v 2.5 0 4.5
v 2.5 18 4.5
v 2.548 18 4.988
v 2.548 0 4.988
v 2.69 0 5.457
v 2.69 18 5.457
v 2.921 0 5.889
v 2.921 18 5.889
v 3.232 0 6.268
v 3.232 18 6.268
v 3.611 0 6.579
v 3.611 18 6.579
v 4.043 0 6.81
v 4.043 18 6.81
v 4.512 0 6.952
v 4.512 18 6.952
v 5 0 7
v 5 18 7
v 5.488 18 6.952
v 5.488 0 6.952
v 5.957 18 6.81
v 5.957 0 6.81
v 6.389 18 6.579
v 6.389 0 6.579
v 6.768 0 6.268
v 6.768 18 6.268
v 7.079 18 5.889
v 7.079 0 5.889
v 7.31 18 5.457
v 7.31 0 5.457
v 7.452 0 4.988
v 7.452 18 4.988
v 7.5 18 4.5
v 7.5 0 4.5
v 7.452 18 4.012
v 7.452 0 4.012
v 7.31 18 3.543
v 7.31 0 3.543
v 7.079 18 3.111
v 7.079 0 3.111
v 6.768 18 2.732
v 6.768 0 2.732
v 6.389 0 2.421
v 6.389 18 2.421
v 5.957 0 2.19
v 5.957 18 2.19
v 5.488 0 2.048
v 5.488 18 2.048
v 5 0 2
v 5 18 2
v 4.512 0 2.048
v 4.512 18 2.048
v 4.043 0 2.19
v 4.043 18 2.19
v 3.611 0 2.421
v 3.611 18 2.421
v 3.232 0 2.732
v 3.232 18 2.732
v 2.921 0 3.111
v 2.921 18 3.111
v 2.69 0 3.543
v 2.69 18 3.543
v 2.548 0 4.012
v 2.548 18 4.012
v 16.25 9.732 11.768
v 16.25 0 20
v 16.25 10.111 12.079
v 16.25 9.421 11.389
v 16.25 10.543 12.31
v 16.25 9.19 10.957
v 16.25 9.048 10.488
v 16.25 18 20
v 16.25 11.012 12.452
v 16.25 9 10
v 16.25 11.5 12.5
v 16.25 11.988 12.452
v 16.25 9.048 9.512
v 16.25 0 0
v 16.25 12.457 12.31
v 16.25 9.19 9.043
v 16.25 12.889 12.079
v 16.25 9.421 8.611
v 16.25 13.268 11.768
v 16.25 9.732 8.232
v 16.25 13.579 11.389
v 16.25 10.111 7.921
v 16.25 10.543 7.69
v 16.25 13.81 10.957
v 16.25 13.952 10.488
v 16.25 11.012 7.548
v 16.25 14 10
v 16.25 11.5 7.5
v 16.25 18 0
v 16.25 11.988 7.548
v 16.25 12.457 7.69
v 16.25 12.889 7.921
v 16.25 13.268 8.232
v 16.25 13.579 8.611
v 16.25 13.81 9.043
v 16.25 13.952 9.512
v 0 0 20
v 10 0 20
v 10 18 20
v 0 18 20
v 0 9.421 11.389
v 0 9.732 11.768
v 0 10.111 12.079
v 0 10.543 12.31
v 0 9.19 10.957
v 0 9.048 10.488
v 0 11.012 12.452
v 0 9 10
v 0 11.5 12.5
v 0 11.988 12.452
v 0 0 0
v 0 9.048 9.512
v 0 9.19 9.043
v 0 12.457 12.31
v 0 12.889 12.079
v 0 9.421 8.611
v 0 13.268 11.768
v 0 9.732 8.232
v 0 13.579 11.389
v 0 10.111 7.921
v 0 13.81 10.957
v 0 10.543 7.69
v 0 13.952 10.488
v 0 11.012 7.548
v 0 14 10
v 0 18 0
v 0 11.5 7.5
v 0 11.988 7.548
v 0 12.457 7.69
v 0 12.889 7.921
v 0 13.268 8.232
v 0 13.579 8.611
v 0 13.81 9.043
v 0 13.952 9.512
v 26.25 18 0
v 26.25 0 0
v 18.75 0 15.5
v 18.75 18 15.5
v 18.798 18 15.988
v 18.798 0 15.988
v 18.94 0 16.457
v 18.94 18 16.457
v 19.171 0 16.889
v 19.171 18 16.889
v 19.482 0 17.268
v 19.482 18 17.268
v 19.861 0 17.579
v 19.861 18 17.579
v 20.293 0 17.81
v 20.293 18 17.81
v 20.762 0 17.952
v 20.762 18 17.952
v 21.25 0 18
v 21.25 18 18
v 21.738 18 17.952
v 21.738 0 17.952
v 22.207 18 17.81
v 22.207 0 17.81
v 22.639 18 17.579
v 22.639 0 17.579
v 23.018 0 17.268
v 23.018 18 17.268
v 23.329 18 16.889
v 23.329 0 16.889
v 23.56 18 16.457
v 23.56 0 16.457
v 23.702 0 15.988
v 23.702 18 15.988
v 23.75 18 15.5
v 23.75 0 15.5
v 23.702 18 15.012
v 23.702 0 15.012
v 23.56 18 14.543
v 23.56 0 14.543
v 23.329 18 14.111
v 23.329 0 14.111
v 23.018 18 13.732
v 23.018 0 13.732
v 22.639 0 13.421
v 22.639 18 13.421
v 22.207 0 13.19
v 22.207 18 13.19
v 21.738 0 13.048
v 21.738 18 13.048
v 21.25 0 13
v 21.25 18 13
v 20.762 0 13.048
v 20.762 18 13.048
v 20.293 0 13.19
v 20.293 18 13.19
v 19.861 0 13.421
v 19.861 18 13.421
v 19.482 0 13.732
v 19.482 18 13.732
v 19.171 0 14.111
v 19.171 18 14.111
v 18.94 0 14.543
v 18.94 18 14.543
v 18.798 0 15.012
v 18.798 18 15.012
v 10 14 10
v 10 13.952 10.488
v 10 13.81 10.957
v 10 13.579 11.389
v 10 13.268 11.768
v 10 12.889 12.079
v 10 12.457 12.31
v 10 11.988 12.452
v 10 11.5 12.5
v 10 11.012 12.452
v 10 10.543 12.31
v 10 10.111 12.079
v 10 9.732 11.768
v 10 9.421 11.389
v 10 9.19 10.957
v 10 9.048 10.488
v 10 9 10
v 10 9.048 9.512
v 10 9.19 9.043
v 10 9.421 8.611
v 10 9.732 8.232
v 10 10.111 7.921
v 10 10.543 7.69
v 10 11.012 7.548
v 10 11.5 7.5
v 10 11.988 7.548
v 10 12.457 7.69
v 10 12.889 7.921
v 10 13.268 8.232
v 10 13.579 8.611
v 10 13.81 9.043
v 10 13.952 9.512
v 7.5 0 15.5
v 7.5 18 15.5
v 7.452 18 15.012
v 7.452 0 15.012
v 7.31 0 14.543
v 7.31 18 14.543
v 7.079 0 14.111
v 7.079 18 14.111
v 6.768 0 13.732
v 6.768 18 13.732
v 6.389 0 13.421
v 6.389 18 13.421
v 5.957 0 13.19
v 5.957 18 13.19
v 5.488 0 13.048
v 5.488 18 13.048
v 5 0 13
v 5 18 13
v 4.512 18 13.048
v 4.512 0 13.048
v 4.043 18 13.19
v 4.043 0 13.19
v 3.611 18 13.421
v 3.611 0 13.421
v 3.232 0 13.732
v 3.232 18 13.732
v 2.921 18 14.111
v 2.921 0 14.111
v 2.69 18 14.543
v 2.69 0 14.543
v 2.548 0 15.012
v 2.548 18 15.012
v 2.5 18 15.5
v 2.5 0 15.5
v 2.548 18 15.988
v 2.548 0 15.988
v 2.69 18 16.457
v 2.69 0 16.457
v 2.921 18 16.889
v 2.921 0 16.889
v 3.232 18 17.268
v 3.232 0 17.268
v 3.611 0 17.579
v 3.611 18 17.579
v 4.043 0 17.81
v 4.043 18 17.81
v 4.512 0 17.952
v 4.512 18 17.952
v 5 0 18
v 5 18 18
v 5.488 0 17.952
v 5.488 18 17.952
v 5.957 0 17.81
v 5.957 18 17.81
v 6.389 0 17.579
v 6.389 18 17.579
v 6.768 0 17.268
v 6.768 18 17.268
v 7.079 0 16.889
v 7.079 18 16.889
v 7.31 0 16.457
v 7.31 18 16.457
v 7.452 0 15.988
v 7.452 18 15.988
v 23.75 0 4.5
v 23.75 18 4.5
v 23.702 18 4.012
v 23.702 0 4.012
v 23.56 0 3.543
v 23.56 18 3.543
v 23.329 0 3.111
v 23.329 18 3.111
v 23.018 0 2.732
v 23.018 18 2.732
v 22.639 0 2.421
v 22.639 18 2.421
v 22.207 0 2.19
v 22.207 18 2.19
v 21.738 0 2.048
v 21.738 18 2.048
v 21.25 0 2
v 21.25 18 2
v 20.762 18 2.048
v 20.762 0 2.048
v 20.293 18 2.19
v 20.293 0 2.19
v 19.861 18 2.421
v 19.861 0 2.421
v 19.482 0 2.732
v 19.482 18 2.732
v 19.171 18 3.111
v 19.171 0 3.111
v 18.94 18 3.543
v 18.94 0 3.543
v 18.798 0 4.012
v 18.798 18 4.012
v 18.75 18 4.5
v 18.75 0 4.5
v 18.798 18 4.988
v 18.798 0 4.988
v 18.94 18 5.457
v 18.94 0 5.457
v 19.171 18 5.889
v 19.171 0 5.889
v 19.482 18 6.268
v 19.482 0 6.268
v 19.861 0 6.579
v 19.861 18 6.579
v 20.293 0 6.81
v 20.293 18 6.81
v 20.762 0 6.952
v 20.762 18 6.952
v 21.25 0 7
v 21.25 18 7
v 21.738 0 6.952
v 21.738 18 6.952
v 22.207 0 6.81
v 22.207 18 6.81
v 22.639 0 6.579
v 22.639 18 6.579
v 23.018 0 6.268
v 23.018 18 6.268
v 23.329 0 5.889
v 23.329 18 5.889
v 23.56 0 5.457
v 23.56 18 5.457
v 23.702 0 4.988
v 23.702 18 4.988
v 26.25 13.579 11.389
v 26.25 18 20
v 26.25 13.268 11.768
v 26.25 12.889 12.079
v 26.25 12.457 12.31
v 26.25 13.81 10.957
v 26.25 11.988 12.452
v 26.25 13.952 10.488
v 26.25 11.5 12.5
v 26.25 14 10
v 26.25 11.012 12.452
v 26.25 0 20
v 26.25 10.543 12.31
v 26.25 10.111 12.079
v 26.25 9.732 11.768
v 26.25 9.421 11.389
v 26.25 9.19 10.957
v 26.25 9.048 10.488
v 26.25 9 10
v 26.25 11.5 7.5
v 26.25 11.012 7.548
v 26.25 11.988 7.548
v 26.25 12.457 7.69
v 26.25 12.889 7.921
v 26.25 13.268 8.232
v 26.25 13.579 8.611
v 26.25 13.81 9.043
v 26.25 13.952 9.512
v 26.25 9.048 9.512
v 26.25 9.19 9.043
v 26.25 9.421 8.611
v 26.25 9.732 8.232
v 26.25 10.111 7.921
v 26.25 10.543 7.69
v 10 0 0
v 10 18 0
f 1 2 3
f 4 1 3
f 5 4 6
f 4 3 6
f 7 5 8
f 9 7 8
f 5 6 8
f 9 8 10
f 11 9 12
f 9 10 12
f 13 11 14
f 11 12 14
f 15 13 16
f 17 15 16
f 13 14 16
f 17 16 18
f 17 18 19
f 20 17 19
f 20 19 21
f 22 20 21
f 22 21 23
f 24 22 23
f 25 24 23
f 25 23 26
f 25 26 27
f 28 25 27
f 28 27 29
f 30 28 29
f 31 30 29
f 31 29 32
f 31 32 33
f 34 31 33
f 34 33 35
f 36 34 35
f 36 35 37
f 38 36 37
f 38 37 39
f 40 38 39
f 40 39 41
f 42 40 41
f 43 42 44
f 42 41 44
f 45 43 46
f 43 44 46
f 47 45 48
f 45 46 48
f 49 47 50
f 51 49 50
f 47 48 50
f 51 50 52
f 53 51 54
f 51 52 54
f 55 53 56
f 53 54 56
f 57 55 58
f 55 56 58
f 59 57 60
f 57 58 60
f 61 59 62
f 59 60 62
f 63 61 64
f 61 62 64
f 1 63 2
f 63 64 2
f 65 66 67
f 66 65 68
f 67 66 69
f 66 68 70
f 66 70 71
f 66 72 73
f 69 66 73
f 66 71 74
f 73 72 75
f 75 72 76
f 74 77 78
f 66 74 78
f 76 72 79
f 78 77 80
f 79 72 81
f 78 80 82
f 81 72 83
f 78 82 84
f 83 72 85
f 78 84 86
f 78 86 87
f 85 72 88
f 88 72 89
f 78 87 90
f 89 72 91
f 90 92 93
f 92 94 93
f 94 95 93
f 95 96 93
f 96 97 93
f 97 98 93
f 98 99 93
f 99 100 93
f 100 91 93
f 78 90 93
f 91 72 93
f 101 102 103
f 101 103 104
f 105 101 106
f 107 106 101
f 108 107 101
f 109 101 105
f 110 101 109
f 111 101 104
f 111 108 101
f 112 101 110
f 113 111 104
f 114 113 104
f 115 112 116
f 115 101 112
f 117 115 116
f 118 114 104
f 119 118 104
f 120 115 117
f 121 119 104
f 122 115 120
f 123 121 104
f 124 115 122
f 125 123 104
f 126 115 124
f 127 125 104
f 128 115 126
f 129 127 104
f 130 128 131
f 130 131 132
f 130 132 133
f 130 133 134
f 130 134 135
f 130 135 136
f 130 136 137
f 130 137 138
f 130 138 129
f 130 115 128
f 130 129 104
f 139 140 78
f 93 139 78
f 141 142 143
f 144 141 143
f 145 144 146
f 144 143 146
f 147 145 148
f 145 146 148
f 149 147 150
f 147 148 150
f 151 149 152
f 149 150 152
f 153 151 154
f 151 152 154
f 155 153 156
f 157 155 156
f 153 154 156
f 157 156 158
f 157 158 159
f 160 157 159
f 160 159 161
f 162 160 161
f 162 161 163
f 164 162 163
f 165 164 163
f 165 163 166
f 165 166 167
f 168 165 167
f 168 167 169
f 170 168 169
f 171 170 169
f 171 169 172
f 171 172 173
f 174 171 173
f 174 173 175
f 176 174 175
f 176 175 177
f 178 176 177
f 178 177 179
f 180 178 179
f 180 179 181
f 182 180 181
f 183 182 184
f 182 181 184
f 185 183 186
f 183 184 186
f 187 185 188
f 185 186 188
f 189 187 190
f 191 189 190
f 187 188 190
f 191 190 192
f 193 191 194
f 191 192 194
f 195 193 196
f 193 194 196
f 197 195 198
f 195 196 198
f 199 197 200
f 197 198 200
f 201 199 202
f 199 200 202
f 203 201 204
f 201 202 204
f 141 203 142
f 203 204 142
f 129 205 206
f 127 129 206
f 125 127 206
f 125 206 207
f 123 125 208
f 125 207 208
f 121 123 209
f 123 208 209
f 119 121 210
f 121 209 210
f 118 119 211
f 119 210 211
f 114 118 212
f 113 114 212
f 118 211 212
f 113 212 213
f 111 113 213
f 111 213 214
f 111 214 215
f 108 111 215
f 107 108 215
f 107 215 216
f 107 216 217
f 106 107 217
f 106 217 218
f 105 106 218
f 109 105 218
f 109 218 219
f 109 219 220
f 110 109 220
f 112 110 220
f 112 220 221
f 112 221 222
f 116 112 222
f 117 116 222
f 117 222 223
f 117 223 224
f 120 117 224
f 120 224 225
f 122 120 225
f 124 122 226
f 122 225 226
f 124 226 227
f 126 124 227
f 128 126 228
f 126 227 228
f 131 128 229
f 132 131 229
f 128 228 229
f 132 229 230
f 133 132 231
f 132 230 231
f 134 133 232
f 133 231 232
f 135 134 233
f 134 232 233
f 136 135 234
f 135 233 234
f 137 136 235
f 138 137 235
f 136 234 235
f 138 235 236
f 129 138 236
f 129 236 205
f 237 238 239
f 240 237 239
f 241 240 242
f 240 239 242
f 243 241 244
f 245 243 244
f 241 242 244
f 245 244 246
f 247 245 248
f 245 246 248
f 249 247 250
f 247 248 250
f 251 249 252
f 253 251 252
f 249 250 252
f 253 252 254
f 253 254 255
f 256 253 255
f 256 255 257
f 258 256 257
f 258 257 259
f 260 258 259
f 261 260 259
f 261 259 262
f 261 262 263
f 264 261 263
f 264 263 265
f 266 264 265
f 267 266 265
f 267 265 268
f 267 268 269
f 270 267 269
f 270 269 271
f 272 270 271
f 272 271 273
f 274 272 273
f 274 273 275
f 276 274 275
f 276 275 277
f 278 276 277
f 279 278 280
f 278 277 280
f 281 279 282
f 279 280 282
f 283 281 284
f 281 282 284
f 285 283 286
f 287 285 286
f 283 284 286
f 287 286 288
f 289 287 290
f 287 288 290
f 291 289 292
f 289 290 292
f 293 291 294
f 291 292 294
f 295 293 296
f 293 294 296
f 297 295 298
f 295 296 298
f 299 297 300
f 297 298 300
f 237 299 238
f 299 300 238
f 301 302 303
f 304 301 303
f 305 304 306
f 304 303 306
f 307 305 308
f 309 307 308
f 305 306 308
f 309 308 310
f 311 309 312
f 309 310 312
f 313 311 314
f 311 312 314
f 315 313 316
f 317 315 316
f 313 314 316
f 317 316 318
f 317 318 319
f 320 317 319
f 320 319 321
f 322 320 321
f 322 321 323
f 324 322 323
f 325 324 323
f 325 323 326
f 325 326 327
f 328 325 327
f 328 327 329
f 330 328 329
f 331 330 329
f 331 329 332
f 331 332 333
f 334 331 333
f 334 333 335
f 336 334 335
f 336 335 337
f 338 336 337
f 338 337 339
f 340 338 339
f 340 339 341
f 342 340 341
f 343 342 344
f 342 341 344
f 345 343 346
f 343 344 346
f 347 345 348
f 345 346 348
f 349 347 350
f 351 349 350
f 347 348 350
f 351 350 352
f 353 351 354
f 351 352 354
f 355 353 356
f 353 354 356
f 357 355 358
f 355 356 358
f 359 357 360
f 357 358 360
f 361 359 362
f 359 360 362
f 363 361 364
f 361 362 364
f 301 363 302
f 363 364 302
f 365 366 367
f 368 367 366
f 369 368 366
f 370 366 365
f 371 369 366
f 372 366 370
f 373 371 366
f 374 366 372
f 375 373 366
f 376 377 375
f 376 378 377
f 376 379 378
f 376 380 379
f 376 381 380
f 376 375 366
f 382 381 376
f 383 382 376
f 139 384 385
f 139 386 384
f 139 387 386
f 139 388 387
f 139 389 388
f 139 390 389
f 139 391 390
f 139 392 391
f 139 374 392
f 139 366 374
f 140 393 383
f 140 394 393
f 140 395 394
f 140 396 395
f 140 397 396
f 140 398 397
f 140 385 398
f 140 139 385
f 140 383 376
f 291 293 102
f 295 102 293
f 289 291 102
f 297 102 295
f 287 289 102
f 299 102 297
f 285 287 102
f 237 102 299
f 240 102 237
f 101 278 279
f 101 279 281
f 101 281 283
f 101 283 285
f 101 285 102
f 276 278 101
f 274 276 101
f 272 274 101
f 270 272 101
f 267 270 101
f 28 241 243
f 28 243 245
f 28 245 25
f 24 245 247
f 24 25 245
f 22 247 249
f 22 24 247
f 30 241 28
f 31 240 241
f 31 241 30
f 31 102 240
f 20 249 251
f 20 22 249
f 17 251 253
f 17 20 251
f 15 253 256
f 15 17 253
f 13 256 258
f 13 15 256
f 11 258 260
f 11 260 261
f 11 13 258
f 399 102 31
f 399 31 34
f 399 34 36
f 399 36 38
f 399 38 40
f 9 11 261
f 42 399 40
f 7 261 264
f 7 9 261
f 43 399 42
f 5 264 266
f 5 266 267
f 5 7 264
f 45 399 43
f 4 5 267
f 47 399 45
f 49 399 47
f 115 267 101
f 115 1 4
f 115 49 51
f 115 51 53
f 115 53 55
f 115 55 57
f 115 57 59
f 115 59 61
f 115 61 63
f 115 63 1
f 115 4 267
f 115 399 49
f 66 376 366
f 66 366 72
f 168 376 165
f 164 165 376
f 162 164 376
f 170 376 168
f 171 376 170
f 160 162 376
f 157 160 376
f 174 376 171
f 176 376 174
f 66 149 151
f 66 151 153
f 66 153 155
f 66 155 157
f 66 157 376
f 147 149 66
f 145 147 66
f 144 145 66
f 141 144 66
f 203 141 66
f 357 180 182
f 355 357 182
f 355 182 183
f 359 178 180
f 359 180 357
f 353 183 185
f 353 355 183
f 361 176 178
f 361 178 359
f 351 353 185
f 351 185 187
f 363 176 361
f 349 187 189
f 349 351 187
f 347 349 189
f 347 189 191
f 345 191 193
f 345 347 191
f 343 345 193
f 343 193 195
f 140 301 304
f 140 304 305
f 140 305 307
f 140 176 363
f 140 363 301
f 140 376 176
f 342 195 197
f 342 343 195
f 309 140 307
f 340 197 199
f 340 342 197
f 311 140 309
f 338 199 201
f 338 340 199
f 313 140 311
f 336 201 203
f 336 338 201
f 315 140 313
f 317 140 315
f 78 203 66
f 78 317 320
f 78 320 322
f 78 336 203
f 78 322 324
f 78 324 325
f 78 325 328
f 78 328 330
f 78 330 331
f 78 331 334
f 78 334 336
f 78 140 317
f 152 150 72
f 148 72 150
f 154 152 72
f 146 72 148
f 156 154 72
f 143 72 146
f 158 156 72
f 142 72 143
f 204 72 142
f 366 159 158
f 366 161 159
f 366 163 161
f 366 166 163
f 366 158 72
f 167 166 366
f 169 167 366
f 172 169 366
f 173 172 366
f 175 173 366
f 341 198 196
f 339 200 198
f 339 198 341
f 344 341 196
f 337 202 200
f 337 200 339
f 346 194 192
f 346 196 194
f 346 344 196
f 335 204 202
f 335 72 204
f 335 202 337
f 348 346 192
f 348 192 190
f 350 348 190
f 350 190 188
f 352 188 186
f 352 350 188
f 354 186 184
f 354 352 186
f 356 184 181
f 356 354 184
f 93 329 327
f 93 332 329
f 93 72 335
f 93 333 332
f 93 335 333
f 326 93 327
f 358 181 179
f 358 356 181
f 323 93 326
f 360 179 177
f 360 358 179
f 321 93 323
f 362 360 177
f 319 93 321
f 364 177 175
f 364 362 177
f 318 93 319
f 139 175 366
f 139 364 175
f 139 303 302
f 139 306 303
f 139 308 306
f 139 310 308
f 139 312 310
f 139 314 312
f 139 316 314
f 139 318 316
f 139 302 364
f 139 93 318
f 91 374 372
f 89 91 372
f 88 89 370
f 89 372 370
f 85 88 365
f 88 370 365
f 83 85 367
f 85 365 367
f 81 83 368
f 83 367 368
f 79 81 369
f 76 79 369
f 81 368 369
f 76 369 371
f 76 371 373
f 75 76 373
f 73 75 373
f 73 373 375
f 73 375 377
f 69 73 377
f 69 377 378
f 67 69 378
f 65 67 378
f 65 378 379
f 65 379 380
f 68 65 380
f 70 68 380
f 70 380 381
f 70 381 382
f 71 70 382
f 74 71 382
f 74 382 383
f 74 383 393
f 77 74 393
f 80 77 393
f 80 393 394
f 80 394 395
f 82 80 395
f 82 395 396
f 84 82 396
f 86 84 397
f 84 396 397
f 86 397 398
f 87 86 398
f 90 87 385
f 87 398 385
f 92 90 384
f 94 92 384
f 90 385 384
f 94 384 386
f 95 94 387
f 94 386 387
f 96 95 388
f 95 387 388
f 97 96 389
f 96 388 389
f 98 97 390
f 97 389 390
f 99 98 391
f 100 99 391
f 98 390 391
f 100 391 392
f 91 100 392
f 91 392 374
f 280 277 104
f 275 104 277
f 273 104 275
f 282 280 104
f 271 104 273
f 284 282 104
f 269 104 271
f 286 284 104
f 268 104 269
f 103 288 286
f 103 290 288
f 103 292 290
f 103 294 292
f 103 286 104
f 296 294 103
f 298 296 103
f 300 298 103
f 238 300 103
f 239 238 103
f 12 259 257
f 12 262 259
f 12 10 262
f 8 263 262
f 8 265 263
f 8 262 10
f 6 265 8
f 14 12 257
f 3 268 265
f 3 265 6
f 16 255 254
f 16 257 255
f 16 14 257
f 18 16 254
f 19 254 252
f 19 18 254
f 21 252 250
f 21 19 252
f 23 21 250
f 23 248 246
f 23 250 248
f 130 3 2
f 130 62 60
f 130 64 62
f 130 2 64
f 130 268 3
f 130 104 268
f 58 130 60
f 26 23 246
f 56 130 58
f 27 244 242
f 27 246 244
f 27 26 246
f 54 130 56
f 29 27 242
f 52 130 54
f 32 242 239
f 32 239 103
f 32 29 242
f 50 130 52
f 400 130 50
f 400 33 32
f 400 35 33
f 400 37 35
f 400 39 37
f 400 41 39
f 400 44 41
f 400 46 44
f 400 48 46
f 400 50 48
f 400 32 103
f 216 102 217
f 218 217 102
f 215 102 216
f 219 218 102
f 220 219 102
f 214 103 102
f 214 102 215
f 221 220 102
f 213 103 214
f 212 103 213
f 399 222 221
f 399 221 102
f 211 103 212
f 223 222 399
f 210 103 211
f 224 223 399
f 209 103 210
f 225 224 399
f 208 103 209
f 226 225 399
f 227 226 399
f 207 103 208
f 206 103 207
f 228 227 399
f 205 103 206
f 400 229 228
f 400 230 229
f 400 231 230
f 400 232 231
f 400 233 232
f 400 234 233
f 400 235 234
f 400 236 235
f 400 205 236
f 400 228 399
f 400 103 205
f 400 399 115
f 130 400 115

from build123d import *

# Parameters (mm, degrees)
BOSS_EXTRUDE1_DEPTH = 20
SKETCH3_R           = 2.5
CUT_EXTRUDE1_DEPTH  = 38.59072359
SKETCH4_R           = 2.5
CUT_EXTRUDE4_DEPTH  = 38.59072359
SKETCH5_W           = 6.25
SKETCH5_H           = 20
CUT_EXTRUDE5_DEPTH  = 37.25


with BuildPart() as part:
    # Sketch2 → Boss-Extrude1 (new body)
    with BuildSketch(Plane.XY):
        Polygon((0, 0), (0, 18), (10, 18), (10, 3), (16.25, 3), (16.25, 18), (26.25, 18), (26.25, 0), align=None)
    extrude(amount=BOSS_EXTRUDE1_DEPTH)

    # Sketch3 → Cut-Extrude1 (cut, through all)
    with BuildSketch(Plane(origin=(0, 18, 0), x_dir=(1, 0, 0), z_dir=(0, 1, 0))):
        with Locations(Location((21.25, -15.5, 0), (0, 0, 180))):
            Circle(SKETCH3_R)
        with Locations((21.25, -4.5)):
            Circle(SKETCH3_R)
        with Locations((5, -15.5)):
            Circle(SKETCH3_R)
        with Locations(Location((5, -4.5, 0), (0, 0, 180))):
            Circle(SKETCH3_R)
    extrude(amount=-CUT_EXTRUDE1_DEPTH, mode=Mode.SUBTRACT)

    # Sketch4 → Cut-Extrude4 (cut, through all)
    with BuildSketch(Plane(origin=(26.25, 0, 0), x_dir=(0, 0, -1), z_dir=(1, 0, 0))):
        with Locations(Location((-10, 11.5, 0), (0, 0, 90))):
            Circle(SKETCH4_R)
    extrude(amount=-CUT_EXTRUDE4_DEPTH, mode=Mode.SUBTRACT)

    # Sketch5 → Cut-Extrude5 (cut, through all)
    with BuildSketch(Plane(origin=(0, 3, 0), x_dir=(1, 0, 0), z_dir=(0, 1, 0))):
        with Locations((13.125, -10)):
            Rectangle(SKETCH5_W, SKETCH5_H)
    extrude(amount=-CUT_EXTRUDE5_DEPTH, mode=Mode.SUBTRACT)


with BuildPart() as cut_extrude5_piece_1:
    # of the separate pieces the step leaves, piece 1, a body of its own (cut_extrude5_pieces)
    add(part.part.solids().sort_by_distance((26.25, 0, 0))[0])


with BuildPart() as cut_extrude5_piece_2:
    # of the separate pieces the step leaves, piece 2, a body of its own (cut_extrude5_pieces)
    add(part.part.solids().sort_by_distance((0, 0, 0))[0])


solid = Compound([cut_extrude5_piece_1.part, cut_extrude5_piece_2.part])
